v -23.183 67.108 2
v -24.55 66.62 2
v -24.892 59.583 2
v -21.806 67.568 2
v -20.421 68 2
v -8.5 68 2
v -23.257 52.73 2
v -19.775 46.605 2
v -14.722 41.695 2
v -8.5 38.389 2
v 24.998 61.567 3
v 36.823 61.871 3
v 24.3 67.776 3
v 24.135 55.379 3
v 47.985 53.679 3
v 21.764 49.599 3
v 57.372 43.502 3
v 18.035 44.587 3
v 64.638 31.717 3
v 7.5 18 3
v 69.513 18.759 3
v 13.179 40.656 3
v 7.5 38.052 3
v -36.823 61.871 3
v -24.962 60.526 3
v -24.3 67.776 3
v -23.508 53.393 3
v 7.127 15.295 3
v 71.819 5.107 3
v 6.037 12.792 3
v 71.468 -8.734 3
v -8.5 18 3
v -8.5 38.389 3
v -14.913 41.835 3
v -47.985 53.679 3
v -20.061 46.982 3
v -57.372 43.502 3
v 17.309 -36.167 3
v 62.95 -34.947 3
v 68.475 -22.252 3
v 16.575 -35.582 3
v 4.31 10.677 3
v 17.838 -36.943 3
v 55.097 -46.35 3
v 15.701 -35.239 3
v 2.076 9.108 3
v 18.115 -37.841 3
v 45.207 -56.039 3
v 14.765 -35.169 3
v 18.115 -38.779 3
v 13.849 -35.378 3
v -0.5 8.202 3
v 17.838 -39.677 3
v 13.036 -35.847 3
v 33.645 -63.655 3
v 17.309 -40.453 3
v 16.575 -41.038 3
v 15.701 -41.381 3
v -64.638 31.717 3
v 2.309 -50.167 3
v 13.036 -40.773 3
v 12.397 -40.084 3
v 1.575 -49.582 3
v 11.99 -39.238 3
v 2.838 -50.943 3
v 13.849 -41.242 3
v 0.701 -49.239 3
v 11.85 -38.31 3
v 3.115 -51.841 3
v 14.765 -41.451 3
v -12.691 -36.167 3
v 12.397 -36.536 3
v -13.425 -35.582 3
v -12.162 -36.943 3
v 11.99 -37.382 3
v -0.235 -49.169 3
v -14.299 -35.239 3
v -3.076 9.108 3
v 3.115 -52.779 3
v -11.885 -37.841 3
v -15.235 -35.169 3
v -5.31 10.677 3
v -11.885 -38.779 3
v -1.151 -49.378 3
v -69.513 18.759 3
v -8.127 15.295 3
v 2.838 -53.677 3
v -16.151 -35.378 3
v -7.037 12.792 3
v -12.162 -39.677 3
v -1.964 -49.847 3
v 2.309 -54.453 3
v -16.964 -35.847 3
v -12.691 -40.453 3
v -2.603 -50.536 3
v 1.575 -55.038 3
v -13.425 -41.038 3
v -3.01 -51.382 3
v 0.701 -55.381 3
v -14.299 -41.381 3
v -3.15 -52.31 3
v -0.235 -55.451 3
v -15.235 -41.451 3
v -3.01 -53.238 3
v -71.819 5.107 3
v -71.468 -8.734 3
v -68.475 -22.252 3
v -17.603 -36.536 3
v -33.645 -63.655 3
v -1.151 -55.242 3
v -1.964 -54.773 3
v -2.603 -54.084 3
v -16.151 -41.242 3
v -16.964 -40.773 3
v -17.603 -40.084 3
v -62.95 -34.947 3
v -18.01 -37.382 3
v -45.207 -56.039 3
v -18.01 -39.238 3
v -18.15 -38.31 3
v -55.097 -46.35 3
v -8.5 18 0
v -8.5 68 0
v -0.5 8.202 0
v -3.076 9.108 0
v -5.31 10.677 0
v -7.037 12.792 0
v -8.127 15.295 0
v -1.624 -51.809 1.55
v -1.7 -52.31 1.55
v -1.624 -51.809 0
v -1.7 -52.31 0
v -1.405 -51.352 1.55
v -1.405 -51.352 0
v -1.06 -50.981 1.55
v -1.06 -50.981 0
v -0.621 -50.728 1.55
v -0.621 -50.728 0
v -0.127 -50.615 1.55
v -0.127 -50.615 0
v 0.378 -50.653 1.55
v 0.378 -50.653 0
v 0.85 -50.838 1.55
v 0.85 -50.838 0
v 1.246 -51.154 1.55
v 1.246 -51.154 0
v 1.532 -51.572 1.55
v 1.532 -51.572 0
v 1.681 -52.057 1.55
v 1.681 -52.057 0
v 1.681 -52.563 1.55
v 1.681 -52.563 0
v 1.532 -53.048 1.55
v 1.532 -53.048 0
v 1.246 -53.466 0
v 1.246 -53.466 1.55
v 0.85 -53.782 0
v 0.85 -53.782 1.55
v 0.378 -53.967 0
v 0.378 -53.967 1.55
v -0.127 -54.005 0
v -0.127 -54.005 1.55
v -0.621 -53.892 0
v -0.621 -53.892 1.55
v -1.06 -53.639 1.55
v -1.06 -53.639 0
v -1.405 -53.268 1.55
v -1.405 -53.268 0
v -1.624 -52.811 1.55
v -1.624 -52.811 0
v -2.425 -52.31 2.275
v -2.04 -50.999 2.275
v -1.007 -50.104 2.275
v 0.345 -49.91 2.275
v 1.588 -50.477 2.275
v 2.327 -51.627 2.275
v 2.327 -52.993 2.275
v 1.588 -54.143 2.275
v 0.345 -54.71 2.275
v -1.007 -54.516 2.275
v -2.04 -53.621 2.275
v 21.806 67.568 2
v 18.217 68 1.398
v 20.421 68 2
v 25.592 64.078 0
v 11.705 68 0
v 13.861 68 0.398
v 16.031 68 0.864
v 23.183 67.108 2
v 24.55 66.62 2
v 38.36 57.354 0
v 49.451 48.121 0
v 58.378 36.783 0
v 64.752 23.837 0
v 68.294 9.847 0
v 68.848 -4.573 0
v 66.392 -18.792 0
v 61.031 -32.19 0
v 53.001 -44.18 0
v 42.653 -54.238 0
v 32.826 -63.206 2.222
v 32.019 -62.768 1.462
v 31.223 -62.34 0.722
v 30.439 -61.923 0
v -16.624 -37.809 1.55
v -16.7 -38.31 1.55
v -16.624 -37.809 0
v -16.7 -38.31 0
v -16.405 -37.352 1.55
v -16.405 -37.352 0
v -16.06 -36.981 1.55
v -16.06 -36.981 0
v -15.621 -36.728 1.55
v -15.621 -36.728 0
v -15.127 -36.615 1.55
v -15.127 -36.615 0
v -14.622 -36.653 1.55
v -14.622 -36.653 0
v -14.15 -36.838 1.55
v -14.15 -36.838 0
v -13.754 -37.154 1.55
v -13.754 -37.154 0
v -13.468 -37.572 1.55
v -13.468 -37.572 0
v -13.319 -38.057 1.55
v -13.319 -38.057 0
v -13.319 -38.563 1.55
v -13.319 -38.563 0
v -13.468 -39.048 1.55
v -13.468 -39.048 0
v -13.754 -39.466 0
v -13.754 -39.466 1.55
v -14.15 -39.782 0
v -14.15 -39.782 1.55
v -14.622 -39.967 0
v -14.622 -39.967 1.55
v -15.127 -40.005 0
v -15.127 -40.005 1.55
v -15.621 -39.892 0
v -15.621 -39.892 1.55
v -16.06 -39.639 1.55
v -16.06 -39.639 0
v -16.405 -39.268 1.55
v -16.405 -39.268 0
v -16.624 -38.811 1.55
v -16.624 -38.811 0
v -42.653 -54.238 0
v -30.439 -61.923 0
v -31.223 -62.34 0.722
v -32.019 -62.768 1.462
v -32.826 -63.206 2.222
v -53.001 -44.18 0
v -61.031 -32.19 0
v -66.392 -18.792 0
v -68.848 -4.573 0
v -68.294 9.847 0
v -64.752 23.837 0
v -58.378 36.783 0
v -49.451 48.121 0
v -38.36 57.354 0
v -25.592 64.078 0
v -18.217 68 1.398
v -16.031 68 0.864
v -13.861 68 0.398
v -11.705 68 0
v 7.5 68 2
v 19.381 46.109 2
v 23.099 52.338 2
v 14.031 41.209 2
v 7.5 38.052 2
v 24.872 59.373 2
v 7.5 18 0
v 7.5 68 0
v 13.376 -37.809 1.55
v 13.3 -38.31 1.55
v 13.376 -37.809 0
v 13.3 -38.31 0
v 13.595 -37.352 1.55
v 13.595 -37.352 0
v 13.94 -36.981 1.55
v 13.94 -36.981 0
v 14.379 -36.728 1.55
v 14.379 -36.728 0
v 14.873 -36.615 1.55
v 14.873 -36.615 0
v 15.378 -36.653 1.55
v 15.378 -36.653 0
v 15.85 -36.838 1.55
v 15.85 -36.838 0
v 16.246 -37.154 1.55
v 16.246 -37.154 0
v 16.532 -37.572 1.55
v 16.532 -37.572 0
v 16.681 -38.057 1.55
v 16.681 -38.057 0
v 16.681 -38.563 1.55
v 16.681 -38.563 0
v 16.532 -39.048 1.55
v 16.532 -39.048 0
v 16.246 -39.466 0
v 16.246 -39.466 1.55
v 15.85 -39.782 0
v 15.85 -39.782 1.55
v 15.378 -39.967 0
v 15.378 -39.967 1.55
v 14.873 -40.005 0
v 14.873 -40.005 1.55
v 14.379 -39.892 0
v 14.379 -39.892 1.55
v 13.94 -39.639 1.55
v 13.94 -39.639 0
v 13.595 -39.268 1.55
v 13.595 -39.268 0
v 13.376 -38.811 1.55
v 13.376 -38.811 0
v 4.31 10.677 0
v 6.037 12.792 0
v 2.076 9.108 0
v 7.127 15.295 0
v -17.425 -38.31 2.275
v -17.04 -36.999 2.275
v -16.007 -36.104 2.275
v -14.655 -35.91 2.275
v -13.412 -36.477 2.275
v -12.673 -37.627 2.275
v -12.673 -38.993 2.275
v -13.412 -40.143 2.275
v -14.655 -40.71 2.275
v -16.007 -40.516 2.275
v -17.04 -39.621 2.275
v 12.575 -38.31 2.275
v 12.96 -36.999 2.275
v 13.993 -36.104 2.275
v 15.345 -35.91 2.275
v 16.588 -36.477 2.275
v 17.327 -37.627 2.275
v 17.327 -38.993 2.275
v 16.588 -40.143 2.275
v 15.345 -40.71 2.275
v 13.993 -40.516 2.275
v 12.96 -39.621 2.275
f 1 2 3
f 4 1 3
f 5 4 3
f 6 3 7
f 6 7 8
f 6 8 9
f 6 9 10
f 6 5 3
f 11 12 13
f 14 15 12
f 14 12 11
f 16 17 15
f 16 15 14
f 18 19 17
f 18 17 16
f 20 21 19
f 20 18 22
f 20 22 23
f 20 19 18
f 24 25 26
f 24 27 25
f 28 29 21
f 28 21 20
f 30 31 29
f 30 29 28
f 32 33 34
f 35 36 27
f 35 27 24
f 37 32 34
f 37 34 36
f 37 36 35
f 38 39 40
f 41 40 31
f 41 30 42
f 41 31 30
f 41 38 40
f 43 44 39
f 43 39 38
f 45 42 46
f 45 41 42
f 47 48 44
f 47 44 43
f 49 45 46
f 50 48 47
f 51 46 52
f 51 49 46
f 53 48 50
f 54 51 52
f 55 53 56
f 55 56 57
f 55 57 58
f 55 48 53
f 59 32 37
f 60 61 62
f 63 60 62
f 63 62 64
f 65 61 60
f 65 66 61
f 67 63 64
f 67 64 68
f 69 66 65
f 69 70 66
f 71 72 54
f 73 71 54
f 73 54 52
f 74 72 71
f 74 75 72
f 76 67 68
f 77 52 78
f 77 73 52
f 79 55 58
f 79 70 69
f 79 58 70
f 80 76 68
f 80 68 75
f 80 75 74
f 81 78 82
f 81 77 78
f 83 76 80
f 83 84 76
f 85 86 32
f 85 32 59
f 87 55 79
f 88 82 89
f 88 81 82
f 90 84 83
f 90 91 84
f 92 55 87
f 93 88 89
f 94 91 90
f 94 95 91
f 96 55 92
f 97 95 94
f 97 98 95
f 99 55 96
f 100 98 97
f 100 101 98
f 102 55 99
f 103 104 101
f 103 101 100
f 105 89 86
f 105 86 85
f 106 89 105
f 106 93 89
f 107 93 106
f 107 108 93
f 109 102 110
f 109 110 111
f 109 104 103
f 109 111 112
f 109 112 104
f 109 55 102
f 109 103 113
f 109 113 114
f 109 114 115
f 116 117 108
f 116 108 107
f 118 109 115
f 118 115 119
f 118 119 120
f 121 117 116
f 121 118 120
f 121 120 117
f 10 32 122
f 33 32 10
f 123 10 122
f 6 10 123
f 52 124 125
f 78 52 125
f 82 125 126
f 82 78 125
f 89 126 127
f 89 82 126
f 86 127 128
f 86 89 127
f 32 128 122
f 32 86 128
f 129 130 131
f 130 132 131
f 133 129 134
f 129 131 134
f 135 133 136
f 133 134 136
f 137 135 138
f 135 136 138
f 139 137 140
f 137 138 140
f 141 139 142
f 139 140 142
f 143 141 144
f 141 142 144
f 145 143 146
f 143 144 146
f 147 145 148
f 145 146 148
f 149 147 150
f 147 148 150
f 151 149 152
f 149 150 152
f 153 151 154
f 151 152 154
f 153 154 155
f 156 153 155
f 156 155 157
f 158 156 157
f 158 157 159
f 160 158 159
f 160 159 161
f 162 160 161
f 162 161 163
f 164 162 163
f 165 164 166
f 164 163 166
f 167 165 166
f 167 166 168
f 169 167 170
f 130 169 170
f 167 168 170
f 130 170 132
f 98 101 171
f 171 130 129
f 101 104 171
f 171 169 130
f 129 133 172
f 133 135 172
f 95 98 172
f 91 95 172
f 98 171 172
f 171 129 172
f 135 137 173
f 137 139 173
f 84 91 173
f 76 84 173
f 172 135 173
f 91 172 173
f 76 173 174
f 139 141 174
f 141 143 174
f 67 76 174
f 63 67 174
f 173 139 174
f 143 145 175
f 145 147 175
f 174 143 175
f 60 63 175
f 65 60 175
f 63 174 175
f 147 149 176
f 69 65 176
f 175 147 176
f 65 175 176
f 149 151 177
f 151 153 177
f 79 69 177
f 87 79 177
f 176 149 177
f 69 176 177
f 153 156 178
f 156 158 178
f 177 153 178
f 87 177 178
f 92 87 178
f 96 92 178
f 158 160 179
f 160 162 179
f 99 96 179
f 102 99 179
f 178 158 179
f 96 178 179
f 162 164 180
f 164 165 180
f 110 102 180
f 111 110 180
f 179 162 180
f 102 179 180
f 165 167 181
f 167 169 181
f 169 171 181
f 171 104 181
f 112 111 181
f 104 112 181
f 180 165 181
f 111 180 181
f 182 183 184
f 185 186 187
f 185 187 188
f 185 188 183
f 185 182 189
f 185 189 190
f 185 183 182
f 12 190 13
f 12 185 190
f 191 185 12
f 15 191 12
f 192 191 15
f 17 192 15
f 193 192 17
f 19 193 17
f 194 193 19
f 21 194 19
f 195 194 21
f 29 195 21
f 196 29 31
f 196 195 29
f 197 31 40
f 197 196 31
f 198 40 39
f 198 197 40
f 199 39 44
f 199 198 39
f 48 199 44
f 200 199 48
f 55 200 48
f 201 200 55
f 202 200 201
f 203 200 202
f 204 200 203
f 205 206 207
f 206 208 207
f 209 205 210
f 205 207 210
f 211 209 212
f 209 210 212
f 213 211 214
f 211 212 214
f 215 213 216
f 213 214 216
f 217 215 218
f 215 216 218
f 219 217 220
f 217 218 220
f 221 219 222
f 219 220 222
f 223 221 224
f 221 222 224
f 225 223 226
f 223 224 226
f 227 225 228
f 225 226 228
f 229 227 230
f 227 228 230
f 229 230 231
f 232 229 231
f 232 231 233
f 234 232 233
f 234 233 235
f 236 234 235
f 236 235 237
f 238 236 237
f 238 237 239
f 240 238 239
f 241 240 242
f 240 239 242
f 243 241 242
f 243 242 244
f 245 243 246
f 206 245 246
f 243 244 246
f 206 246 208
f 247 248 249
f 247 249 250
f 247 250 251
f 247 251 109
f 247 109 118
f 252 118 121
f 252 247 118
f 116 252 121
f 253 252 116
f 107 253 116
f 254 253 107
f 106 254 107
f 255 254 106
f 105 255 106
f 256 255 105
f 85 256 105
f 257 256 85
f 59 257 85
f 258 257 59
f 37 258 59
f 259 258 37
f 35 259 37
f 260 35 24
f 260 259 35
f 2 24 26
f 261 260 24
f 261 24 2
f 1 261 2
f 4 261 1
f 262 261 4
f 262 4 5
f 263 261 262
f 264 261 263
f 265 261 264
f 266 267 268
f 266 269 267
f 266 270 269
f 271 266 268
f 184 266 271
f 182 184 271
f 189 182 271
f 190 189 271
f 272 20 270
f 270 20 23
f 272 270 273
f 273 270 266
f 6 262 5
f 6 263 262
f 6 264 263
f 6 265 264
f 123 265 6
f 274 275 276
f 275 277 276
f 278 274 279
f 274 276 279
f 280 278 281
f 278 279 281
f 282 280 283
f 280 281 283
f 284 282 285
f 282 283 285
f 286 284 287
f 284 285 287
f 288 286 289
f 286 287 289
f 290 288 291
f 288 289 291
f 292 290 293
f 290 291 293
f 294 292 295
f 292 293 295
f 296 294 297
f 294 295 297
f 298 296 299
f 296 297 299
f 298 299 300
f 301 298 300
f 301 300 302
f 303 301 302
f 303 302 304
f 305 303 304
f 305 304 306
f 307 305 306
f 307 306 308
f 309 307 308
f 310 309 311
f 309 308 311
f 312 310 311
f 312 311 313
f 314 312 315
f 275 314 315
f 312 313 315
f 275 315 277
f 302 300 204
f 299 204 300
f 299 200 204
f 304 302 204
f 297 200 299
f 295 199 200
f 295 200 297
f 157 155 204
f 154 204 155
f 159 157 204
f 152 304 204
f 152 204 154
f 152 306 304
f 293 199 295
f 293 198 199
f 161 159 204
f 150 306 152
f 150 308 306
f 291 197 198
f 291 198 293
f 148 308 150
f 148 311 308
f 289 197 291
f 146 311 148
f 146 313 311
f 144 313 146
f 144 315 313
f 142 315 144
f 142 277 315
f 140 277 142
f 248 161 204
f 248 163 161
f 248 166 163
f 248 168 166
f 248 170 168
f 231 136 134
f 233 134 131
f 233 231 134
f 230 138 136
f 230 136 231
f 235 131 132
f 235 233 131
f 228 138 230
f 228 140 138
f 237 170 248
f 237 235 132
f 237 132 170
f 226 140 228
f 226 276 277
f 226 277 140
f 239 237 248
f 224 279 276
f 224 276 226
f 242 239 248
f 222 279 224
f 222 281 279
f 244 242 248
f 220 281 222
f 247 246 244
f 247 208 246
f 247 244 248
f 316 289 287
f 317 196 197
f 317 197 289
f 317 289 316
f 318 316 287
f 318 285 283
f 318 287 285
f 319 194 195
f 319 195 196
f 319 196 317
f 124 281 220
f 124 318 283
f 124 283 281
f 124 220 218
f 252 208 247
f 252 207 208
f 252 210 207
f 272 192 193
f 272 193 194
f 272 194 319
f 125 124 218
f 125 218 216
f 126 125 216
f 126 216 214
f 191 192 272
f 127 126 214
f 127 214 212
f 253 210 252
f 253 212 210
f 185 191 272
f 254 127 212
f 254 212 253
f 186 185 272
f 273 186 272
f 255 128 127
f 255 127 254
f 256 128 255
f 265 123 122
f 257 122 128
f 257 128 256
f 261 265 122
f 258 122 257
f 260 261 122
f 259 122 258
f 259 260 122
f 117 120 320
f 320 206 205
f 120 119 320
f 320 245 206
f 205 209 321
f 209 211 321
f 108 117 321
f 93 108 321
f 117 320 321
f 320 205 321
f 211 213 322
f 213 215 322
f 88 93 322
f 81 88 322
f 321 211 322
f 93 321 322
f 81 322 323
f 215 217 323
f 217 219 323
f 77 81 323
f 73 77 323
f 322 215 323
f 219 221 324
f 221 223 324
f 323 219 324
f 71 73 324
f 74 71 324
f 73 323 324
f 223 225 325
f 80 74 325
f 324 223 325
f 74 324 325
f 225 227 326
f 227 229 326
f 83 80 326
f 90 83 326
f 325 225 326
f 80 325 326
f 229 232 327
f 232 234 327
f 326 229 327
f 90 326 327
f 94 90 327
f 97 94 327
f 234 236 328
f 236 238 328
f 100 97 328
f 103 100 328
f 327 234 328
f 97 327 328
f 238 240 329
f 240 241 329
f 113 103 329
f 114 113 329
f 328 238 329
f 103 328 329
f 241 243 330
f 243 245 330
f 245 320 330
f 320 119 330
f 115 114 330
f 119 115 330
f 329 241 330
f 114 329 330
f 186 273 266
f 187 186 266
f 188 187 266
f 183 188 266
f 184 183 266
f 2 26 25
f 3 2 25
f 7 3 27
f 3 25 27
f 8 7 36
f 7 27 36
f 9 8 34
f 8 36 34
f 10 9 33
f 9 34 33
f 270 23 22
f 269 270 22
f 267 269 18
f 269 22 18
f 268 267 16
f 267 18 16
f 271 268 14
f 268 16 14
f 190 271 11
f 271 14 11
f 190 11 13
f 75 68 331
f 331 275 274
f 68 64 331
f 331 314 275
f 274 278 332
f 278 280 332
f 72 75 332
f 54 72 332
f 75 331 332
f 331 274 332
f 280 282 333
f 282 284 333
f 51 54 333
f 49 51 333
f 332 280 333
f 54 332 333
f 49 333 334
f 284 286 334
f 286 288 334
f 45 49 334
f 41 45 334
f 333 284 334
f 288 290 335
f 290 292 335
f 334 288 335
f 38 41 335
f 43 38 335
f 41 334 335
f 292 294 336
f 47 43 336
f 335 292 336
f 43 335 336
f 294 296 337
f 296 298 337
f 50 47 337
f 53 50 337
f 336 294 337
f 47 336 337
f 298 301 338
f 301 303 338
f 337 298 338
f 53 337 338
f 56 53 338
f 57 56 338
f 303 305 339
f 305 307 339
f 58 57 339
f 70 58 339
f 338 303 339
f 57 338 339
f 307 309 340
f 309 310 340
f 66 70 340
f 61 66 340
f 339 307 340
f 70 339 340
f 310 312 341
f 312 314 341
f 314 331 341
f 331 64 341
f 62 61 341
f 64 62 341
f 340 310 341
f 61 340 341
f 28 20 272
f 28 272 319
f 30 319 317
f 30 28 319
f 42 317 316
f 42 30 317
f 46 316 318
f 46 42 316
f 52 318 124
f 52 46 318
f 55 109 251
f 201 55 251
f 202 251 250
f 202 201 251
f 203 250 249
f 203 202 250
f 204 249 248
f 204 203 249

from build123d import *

# Parameters (mm, degrees)
BOSS_EXTRUDE2_DEPTH                                 = 3
CSK_FOR_M3_COUNTERSUNK_FLAT_HEAD_SCREW1_D           = 3.4
CSK_FOR_M3_COUNTERSUNK_FLAT_HEAD_SCREW1_DEPTH       = 3
CSK_FOR_M3_COUNTERSUNK_FLAT_HEAD_SCREW1_CSINK_D     = 6.3
CSK_FOR_M3_COUNTERSUNK_FLAT_HEAD_SCREW1_CSINK_ANGLE = 90
CSK_FOR_M3_COUNTERSUNK_FLAT_HEAD_SCREW1_TIP         = 1.021463052
SKETCH4_W                                           = 16
SKETCH4_H                                           = 60
CUT_EXTRUDE1_DEPTH                                  = 3
SKETCH5_R                                           = 25
CUT_EXTRUDE2_DEPTH                                  = 1
FILLET1_R                                           = 10
CUT_EXTRUDE3_DEPTH                                  = 21
CHAMFER2_SIZE                                       = 5
CHAMFER2_SIZE_2                                     = 2.886751346


with BuildPart() as part:
    # Sketch1 → Boss-Extrude2 (new body)
    with BuildSketch(Plane.XY):
        with BuildLine():
            Line((-23.664319132, 68), (23.664319132, 68))
            ThreePointArc((23.664319132, 68), (0, -72), (-23.664319132, 68))
        make_face()
    extrude(amount=BOSS_EXTRUDE2_DEPTH)

    # CSK for M3 Countersunk Flat Head Screw1
    with Locations(Plane.XY.offset(3)):
        with Locations((15, -38.31), (-15, -38.31), (0, -52.31)):
            CounterSinkHole(CSK_FOR_M3_COUNTERSUNK_FLAT_HEAD_SCREW1_D / 2, CSK_FOR_M3_COUNTERSUNK_FLAT_HEAD_SCREW1_CSINK_D / 2, depth=CSK_FOR_M3_COUNTERSUNK_FLAT_HEAD_SCREW1_DEPTH, counter_sink_angle=CSK_FOR_M3_COUNTERSUNK_FLAT_HEAD_SCREW1_CSINK_ANGLE)
            with Locations((0, 0, -(CSK_FOR_M3_COUNTERSUNK_FLAT_HEAD_SCREW1_DEPTH + CSK_FOR_M3_COUNTERSUNK_FLAT_HEAD_SCREW1_TIP / 2))):  # 118° drill point
                Cone(0, CSK_FOR_M3_COUNTERSUNK_FLAT_HEAD_SCREW1_D / 2, CSK_FOR_M3_COUNTERSUNK_FLAT_HEAD_SCREW1_TIP, mode=Mode.SUBTRACT)

    # Sketch4 → Cut-Extrude1 (cut)
    with BuildSketch(Plane.XY.offset(3)):
        with Locations((-0.5, 38)):
            Rectangle(SKETCH4_W, SKETCH4_H)
    extrude(amount=-CUT_EXTRUDE1_DEPTH, mode=Mode.SUBTRACT)

    # Sketch5 → Cut-Extrude2 (cut)
    with BuildSketch(Plane.XY.offset(3)):
        with Locations((0, 61.9)):
            Circle(SKETCH5_R)
    extrude(amount=-CUT_EXTRUDE2_DEPTH, mode=Mode.SUBTRACT)

    # Fillet1
    # the kernel refuses this fillet: 10 mm, written as the material it adds along each edge
    with BuildSketch(Plane(origin=(-8.5, 8, 3), x_dir=(1, 0, 0), z_dir=(0, 0, -1)), Plane(origin=(7.5, 8, 3), x_dir=(0, 1, 0), z_dir=(0, 0, -1))) as fillet1_piece_1:
        with BuildLine():
            CenterArc((FILLET1_R, -FILLET1_R), FILLET1_R, 90, 90)
            Line((0, -FILLET1_R), (0, 0))
            Line((0, 0), (FILLET1_R, 0))
        make_face()
    extrude(amount=3)

    # Sketch1<3> → Cut-Extrude3 (cut)
    with BuildSketch(Plane.XY):
        with BuildLine():
            Line((31.363416587, -64.81), (-31.363416587, -64.81))
            ThreePointArc((-31.363416587, -64.81), (0, -72), (31.363416587, -64.81))
        make_face()
    extrude(amount=CUT_EXTRUDE3_DEPTH, mode=Mode.SUBTRACT)

    # Chamfer2
    # the kernel refuses this chamfer: 5, 2.886751346 mm, written as the material it takes off along each edge
    with BuildSketch(Plane(origin=(44.29884536, -64.81, 0), x_dir=(0, -0.019326765612699606, 0.9998132206222079), z_dir=(-1, 0, 0))) as chamfer2_piece_1:
        Polygon((CHAMFER2_SIZE * 0.999813220622, CHAMFER2_SIZE * 0.0193267656127), (-CHAMFER2_SIZE_2 * 0.0193267656124, CHAMFER2_SIZE_2 * 0.999813220604), (0, 0), align=None)
    extrude(amount=88.59769072, mode=Mode.SUBTRACT)

    # Chamfer3
    # the kernel refuses this chamfer: 3 mm, written as the material it takes off along each edge
    with BuildSketch(Plane(origin=(0, 0, 0), x_dir=(0.07743421660335849, 0.9969974634366048, 0), z_dir=(-0.9969974634366048, 0.07743421660335849, 0))) as chamfer3_piece_1:
        with BuildLine():
            Line((72.084852814, -3.084852814), (68.915147186, 0.084852814))
            Line((68.915147186, 0.084852814), (68.915147186, 0.144852814))
            ThreePointArc((68.915147186, 0.144852814), (70.457573593, 0.06), (72, 0.06))
            Line((72, 0.06), (72.06, 0))
            ThreePointArc((72.06, 0), (72.06, -1.542426407), (72.144852814, -3.084852814))
            Line((72.144852814, -3.084852814), (72.084852814, -3.084852814))
        make_face()
    revolve(axis=Axis((0, 0, 0), (0, 0, -1)), revolution_arc=159.627586722, mode=Mode.SUBTRACT)
    with BuildSketch(Plane(origin=(0, 0, 0), x_dir=(-0.27448479603236836, -0.9615914396182347, 0), z_dir=(0.9615914396182347, -0.27448479603236836, 0))) as chamfer3_piece_2:
        with BuildLine():
            Line((72.084852814, -3.084852814), (68.915147186, 0.084852814))
            Line((68.915147186, 0.084852814), (68.915147186, 0.144852814))
            ThreePointArc((68.915147186, 0.144852814), (70.457573593, 0.06), (72, 0.06))
            Line((72, 0.06), (72.06, 0))
            ThreePointArc((72.06, 0), (72.06, -1.542426407), (72.144852814, -3.084852814))
            Line((72.144852814, -3.084852814), (72.084852814, -3.084852814))
        make_face()
    revolve(axis=Axis((0, 0, 0), (0, 0, -1)), revolution_arc=159.627586722, mode=Mode.SUBTRACT)


solid = part.part
